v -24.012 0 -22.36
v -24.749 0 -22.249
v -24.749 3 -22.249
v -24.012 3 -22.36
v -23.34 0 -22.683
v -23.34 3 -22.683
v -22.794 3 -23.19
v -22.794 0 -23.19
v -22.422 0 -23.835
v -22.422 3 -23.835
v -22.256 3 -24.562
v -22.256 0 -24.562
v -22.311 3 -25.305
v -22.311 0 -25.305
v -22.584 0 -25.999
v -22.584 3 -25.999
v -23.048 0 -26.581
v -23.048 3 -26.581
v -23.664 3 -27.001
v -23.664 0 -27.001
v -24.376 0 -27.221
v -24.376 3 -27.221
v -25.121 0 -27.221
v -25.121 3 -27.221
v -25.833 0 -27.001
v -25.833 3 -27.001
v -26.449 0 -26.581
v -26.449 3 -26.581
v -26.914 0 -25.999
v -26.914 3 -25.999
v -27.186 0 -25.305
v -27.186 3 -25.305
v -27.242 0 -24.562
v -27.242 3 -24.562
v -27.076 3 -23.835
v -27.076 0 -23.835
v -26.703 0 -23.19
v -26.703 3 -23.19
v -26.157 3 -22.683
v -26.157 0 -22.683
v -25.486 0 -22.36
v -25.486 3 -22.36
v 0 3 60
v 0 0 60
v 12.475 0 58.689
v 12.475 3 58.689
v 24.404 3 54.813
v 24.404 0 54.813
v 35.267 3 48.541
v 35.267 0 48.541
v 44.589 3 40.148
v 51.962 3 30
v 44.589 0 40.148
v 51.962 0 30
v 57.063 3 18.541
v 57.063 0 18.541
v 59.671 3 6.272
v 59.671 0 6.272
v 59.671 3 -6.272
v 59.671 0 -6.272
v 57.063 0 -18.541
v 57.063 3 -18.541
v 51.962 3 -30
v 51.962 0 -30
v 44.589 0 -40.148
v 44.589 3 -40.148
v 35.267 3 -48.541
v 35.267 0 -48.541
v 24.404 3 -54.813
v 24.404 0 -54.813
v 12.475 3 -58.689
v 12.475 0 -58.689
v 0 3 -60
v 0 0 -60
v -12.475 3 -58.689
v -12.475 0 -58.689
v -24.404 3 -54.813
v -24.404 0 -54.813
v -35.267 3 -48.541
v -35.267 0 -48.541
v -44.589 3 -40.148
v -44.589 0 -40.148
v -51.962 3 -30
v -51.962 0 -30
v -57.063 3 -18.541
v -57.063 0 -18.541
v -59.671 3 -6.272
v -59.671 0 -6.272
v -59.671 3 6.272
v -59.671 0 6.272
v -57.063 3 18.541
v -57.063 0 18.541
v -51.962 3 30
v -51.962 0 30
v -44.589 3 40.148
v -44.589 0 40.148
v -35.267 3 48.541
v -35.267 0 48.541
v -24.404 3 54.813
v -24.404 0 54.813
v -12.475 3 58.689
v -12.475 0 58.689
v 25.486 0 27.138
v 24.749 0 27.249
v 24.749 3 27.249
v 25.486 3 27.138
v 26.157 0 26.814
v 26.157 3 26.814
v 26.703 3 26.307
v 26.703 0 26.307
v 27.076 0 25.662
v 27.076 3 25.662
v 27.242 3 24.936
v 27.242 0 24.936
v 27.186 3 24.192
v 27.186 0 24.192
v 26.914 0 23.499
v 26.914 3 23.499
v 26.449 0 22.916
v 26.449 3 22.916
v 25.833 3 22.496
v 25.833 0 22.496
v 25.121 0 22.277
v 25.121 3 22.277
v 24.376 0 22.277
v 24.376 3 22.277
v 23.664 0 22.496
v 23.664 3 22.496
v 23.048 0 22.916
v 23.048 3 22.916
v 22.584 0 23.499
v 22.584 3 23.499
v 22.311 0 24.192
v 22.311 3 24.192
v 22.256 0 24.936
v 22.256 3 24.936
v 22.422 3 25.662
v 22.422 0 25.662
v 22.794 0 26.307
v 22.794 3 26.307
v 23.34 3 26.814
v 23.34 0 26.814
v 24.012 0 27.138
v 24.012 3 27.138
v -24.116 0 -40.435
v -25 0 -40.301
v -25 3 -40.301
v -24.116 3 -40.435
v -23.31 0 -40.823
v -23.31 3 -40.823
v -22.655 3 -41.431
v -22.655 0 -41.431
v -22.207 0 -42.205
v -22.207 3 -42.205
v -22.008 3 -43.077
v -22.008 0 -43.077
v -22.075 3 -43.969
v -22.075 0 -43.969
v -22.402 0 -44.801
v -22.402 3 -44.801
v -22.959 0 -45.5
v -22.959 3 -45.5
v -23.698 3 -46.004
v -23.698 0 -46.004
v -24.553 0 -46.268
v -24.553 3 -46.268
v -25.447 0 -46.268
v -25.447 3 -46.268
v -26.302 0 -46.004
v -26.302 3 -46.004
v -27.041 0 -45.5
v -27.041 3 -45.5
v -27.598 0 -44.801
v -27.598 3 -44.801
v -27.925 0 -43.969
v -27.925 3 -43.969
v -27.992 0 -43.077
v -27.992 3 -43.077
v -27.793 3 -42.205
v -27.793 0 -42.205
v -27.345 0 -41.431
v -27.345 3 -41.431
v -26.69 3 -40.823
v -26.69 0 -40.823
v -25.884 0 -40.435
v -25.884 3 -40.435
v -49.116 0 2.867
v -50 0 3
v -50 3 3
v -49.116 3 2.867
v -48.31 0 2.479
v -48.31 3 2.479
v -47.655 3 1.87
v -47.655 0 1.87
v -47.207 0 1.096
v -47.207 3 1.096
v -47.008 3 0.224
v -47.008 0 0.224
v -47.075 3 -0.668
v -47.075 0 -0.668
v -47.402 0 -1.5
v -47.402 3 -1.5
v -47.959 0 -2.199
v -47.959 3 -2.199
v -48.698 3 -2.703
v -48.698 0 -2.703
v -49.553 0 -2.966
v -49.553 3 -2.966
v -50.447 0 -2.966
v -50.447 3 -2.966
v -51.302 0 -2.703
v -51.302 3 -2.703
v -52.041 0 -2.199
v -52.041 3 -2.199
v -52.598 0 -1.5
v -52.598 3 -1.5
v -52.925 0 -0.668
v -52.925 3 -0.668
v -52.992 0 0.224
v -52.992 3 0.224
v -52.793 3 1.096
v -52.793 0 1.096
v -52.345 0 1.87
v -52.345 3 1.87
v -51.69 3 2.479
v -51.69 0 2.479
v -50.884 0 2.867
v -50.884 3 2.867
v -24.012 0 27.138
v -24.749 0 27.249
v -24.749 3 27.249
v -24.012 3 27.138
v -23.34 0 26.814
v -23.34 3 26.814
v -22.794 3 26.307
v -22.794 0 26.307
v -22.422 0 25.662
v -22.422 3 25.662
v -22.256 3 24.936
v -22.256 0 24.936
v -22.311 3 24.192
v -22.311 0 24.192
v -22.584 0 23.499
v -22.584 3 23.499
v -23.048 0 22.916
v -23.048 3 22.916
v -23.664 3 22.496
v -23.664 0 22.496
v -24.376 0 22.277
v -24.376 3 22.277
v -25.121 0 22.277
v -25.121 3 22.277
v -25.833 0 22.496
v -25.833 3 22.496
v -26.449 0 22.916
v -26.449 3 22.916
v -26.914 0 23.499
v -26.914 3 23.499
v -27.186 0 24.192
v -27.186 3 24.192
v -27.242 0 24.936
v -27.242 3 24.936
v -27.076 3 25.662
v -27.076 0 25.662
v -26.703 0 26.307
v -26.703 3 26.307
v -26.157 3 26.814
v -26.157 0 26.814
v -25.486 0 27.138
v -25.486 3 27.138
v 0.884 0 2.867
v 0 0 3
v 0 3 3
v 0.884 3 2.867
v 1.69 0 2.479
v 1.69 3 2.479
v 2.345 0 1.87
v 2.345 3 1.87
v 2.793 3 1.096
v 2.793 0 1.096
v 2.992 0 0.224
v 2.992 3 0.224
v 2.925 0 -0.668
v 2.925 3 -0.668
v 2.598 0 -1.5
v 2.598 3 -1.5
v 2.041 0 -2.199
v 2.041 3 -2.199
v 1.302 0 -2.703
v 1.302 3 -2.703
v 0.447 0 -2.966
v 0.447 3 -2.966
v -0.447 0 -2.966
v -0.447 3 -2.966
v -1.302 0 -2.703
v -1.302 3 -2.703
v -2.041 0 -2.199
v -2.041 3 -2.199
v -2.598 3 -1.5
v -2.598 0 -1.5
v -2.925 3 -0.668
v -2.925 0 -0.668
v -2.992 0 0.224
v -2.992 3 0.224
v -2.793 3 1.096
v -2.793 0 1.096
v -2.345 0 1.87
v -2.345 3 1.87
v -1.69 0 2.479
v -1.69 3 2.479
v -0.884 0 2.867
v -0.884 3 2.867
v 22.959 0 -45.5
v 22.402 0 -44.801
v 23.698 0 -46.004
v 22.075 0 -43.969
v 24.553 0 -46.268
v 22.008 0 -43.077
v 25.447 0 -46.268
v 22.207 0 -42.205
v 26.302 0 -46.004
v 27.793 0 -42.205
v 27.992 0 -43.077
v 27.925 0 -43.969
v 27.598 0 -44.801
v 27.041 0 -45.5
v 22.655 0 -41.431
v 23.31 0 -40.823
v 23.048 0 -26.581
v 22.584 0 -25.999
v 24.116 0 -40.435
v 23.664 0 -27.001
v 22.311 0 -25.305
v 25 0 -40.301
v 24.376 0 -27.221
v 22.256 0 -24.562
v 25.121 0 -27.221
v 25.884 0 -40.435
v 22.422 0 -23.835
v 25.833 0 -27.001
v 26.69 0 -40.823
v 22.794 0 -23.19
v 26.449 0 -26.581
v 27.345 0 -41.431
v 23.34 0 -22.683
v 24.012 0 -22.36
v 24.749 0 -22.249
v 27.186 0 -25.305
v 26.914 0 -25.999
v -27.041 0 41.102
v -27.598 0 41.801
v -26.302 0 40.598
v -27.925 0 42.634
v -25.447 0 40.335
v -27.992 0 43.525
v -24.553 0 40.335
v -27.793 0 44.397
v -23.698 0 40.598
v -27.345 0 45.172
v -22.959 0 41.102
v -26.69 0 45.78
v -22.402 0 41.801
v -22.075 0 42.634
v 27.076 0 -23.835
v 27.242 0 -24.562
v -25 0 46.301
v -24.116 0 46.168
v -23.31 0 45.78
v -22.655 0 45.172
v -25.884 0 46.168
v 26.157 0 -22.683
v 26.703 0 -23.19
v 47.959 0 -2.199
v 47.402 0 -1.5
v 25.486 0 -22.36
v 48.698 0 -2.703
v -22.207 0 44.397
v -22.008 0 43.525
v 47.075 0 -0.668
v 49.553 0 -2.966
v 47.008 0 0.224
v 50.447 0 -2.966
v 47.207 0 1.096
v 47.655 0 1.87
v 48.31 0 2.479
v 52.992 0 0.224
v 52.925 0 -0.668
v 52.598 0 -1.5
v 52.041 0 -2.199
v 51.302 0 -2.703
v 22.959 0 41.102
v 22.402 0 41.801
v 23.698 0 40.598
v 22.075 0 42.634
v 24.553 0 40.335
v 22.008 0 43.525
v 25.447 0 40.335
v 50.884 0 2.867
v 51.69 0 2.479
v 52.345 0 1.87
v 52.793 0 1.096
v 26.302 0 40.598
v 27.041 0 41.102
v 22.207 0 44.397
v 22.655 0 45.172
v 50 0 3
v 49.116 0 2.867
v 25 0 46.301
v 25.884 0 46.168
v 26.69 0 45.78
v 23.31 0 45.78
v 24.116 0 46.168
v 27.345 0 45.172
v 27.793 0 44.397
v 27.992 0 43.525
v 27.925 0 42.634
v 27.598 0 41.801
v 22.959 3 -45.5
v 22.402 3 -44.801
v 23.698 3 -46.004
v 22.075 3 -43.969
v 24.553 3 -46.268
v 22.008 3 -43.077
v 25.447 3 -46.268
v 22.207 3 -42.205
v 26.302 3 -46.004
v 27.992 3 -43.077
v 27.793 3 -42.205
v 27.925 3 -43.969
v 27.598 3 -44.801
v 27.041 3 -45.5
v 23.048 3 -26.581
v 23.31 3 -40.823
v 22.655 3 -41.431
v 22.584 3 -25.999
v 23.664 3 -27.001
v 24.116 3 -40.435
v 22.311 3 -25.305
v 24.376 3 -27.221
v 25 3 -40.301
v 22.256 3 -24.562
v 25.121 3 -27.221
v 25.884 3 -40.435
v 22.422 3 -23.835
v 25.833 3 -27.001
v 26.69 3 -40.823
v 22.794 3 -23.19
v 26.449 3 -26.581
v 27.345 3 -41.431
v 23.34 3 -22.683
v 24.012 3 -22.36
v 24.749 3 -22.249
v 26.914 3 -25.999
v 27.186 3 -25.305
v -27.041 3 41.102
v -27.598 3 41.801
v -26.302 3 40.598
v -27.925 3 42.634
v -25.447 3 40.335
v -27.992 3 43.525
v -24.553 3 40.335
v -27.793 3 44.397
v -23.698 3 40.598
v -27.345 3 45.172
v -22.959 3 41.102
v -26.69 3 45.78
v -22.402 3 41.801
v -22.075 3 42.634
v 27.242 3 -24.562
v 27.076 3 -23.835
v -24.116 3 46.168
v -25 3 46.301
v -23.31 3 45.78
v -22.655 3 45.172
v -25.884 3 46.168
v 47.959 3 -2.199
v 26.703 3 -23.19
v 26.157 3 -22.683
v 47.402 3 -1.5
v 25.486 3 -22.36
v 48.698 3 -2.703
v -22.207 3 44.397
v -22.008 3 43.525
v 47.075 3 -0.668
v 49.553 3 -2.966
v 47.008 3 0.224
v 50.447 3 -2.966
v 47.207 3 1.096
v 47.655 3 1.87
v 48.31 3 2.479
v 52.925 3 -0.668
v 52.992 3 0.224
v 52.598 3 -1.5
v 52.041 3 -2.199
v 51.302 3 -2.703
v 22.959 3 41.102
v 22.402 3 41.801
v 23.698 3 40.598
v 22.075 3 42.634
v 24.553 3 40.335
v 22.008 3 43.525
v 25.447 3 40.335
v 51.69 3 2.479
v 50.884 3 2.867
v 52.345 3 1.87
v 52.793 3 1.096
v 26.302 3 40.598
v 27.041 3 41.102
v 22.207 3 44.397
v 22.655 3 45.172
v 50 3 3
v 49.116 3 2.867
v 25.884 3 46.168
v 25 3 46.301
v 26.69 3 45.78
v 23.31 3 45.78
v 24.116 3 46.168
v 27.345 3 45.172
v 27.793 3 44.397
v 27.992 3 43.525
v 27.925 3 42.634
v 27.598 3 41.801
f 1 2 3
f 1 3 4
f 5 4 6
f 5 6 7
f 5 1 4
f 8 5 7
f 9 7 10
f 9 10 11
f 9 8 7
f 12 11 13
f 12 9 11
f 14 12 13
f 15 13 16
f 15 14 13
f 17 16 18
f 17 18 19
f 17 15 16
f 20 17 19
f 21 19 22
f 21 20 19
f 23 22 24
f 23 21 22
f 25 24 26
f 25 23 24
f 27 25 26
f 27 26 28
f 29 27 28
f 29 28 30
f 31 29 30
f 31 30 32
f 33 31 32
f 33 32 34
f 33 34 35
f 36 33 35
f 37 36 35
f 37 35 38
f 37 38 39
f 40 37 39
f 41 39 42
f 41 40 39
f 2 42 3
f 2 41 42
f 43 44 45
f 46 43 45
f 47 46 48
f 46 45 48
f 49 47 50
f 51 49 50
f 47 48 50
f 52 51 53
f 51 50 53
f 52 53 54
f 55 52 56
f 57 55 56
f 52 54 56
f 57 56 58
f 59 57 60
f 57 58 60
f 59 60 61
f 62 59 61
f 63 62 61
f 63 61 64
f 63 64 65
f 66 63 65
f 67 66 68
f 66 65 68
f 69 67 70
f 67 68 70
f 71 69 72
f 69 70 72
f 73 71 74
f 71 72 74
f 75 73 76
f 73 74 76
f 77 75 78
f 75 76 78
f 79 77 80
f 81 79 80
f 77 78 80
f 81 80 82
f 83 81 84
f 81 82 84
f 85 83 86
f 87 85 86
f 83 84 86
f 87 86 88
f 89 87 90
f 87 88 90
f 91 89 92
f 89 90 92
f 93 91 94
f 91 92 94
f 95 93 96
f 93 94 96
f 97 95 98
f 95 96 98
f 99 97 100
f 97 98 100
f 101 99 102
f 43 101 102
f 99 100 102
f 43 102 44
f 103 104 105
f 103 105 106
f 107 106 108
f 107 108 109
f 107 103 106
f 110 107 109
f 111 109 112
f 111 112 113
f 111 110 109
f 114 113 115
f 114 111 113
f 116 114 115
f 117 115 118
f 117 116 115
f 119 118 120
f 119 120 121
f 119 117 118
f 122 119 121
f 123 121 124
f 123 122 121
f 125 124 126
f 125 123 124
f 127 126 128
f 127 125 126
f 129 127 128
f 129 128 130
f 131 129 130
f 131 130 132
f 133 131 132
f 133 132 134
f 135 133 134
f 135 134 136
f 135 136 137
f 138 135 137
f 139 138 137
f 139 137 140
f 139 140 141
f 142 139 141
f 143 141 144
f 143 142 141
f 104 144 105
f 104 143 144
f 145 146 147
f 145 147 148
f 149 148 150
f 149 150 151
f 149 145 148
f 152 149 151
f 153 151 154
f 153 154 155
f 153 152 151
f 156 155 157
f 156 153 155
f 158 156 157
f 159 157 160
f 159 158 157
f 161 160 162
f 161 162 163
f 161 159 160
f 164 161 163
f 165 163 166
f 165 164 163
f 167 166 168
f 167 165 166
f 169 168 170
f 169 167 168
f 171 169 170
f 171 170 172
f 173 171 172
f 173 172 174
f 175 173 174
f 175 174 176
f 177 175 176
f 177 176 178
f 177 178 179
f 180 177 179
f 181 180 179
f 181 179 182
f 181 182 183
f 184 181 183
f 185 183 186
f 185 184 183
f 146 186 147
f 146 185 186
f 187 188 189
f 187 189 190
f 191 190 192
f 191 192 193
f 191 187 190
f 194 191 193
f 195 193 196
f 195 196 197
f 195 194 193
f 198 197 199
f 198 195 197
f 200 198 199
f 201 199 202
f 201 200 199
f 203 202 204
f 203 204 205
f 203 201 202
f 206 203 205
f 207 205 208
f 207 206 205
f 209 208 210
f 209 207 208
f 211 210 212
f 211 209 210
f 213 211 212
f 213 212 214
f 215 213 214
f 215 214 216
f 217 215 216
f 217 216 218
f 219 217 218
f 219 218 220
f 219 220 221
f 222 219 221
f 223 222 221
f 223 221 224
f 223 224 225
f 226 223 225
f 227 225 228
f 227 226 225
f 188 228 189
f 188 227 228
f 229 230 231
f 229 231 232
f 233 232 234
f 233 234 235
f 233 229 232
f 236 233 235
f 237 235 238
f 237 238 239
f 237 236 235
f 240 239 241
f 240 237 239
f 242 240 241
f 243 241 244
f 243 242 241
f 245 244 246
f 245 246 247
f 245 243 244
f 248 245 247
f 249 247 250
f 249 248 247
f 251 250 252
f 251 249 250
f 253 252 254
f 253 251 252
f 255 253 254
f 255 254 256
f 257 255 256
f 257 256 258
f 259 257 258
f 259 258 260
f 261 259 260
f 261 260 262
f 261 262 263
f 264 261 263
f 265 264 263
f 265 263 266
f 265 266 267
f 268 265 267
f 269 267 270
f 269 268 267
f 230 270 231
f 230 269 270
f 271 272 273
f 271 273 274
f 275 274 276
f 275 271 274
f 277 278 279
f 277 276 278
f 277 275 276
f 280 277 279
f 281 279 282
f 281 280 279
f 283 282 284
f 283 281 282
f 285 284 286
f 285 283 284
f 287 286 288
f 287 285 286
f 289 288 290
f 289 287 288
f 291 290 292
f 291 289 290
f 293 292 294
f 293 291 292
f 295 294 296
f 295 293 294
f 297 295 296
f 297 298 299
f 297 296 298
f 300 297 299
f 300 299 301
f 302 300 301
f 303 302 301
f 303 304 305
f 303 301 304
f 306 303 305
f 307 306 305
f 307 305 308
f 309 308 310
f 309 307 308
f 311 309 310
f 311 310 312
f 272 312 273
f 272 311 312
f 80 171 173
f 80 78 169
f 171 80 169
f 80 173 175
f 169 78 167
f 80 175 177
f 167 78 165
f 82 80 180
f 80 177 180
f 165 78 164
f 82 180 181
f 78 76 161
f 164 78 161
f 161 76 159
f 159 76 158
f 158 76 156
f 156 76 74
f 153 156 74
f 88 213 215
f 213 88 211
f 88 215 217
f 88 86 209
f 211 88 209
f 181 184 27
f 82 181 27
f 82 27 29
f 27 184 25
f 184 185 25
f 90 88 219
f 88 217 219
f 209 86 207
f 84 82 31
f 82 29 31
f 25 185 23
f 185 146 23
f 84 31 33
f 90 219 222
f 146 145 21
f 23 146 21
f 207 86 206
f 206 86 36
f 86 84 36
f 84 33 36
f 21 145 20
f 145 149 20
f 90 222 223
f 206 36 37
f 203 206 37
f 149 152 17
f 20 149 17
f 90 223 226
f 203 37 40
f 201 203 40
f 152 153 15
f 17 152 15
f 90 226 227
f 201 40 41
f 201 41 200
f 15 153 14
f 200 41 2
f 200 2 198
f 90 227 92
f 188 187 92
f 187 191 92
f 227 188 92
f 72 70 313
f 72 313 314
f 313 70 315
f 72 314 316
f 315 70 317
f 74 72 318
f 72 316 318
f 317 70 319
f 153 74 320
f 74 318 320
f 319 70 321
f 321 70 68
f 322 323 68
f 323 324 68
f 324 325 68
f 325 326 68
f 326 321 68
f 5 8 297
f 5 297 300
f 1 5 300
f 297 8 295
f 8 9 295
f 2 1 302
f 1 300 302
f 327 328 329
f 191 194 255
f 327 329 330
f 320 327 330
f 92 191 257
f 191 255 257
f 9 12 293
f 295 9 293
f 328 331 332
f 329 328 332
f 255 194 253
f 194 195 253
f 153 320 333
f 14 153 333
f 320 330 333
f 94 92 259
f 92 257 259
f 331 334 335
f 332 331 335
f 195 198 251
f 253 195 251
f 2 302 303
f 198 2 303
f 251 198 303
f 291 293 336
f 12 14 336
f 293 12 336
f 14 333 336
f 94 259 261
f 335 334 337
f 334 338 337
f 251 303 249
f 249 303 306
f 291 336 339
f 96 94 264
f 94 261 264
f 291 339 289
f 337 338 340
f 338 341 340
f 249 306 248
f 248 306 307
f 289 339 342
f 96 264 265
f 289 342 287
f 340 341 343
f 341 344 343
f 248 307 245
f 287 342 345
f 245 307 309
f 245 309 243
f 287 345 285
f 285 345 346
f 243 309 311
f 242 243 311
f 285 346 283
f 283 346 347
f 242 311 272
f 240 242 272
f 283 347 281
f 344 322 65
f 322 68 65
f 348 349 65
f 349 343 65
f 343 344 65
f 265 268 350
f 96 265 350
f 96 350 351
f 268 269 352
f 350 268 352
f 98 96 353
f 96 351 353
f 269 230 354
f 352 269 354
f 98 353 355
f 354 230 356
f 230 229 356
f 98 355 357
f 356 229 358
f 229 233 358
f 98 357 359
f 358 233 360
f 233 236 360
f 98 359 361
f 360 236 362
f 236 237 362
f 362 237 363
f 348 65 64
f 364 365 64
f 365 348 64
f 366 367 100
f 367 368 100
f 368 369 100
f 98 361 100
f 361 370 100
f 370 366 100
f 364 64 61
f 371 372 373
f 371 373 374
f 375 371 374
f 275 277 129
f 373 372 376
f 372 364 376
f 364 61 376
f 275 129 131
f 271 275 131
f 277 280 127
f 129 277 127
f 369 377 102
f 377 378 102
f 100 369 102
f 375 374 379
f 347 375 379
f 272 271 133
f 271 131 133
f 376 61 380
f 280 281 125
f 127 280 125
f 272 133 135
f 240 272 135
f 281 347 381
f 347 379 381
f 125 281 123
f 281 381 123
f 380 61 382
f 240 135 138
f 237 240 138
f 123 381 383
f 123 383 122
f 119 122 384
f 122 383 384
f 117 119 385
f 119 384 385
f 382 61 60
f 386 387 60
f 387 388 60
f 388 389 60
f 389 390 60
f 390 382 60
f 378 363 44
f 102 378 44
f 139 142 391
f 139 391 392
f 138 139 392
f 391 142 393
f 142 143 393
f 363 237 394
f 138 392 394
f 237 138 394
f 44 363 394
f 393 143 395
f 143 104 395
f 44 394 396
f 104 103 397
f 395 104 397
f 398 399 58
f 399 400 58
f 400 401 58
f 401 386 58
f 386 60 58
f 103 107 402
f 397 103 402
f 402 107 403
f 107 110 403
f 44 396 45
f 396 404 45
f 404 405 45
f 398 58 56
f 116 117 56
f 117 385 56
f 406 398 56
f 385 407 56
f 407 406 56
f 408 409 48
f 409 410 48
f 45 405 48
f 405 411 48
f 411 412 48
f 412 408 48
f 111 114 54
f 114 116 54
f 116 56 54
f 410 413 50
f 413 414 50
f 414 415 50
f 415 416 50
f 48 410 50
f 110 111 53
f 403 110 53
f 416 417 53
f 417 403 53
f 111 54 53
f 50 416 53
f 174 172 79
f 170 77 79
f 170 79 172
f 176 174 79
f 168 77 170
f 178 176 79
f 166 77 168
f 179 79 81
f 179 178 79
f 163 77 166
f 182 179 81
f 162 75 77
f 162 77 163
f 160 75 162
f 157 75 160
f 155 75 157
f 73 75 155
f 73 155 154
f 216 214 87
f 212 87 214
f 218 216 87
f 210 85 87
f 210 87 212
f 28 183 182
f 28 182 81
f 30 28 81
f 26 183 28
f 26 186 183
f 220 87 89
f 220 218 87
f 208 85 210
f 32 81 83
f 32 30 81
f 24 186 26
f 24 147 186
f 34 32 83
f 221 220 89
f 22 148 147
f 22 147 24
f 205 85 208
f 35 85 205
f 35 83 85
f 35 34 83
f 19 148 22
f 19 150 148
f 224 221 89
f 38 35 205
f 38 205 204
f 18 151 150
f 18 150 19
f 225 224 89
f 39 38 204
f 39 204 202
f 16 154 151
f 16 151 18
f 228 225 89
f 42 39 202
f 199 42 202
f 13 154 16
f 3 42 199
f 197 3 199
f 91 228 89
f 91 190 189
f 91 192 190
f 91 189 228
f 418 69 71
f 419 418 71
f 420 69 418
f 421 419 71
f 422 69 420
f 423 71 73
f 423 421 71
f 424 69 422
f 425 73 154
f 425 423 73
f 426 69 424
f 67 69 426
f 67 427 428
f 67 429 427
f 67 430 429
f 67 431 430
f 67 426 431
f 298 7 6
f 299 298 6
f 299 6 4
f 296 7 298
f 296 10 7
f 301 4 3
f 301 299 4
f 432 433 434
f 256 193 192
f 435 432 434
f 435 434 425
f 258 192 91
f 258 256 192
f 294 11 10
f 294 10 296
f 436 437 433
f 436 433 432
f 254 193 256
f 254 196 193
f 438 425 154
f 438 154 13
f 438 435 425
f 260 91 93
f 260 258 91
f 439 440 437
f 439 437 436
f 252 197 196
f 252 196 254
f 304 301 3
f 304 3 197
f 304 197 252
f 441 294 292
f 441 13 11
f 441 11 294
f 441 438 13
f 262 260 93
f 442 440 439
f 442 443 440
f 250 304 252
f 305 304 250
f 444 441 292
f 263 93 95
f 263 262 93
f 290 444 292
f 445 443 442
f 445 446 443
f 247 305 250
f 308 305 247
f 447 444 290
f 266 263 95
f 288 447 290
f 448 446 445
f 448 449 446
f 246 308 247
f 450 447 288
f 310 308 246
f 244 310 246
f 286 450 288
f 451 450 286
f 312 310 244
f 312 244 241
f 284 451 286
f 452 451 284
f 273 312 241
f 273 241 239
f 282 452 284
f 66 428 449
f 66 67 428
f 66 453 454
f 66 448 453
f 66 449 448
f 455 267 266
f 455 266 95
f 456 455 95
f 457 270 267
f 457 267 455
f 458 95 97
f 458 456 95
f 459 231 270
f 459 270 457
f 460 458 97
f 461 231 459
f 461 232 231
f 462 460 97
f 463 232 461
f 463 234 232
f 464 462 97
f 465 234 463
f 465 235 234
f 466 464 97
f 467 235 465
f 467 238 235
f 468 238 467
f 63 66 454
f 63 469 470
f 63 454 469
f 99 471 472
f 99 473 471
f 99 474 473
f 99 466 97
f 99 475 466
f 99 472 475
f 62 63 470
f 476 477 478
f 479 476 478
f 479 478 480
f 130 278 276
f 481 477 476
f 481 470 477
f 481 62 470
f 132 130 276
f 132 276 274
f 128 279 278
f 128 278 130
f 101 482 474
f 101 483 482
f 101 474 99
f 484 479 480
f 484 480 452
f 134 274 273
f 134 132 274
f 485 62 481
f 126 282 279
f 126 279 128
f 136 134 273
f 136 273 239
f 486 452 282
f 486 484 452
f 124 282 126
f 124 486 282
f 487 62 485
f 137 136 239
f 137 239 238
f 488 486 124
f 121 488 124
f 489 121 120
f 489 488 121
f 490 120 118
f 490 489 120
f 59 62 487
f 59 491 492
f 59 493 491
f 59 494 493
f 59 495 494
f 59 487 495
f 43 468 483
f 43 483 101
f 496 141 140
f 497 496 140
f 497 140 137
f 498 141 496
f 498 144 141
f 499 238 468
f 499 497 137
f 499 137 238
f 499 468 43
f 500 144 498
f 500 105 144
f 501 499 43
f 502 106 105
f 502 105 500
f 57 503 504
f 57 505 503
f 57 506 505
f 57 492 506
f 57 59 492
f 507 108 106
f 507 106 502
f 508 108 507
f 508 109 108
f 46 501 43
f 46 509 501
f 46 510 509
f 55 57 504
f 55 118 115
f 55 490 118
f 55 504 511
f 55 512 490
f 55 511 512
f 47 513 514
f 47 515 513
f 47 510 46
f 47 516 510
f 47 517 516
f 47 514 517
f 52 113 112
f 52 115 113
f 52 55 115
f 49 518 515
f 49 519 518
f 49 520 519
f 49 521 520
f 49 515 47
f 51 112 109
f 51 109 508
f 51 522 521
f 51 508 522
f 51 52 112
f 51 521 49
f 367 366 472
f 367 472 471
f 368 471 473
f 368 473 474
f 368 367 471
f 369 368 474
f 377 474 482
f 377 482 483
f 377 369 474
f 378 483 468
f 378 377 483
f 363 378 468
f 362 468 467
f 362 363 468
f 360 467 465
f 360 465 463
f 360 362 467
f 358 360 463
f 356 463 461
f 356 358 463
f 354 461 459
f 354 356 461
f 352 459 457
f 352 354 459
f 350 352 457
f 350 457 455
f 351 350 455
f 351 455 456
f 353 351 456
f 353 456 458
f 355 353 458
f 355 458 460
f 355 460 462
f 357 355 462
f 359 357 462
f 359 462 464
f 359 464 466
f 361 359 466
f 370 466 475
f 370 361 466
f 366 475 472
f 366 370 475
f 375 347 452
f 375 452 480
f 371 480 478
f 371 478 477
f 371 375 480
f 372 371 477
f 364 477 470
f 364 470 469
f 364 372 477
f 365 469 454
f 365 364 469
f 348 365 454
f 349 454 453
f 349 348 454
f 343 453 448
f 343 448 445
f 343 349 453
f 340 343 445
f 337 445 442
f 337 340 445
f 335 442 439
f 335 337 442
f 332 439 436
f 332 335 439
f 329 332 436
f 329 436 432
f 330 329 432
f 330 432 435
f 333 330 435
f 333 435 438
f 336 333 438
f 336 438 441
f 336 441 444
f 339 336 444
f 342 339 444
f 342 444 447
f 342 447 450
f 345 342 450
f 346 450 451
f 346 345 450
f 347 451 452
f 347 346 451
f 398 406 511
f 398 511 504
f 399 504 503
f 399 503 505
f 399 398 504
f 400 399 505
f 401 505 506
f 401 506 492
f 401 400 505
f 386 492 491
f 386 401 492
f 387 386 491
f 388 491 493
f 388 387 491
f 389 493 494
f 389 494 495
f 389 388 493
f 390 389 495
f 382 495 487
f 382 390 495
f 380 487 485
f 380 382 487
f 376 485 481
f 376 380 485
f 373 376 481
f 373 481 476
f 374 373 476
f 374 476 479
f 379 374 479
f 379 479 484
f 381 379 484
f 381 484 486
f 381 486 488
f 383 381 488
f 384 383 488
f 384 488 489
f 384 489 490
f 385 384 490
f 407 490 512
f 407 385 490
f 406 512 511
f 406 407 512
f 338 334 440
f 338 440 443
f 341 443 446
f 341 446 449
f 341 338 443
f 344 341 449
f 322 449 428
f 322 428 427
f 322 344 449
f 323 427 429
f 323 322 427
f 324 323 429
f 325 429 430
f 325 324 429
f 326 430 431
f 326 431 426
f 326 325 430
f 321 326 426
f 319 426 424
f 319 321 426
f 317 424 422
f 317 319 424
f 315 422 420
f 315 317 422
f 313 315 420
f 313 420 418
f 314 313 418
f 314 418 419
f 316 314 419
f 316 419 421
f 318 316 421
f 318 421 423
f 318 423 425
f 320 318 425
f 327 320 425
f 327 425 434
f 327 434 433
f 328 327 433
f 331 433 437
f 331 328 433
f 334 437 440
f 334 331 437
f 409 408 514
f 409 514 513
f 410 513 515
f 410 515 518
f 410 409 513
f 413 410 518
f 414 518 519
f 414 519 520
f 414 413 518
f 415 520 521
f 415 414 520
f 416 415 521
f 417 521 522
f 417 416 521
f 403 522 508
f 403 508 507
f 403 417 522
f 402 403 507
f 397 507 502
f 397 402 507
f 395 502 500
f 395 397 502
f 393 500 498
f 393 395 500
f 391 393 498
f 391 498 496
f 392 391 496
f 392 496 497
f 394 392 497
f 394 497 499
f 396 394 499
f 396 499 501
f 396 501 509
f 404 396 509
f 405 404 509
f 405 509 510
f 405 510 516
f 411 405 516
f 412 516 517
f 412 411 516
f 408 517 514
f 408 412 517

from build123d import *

# Parameters (mm, degrees)
SKETCH1_R               = 60
SKETCH1_R_2             = 2.5
SKETCH1_R_3             = 3
BOSS_EXTRUDE1_DEPTH     = 3
CUT_EXTRUDE1_DEPTH      = 85.905830189
CUT_EXTRUDE1_DEPTH_BACK = 85.905830189
SKETCH2_R               = 3


with BuildPart() as part:
    # Sketch1 → Boss-Extrude1 (new body)
    with BuildSketch(Plane(origin=(0, 0, 0), x_dir=(1, 0, 0), z_dir=(0, 1, 0))):
        with Locations(Location((0, 0, 0), (0, 0, 270))):
            Circle(SKETCH1_R)
        with Locations(Location((-24.748737342, -24.748737342, 0), (0, 0, 270))):
            Circle(SKETCH1_R_2, mode=Mode.SUBTRACT)
        with Locations(Location((24.748737342, -24.748737342, 0), (0, 0, 270))):
            Circle(SKETCH1_R_2, mode=Mode.SUBTRACT)
        with Locations(Location((24.748737342, 24.748737342, 0), (0, 0, 270))):
            Circle(SKETCH1_R_2, mode=Mode.SUBTRACT)
        with Locations(Location((-24.748737342, 24.748737342, 0), (0, 0, 270))):
            Circle(SKETCH1_R_2, mode=Mode.SUBTRACT)
        with Locations(Location((-25, -43.301270189, 0), (0, 0, 270))):
            Circle(SKETCH1_R_3, mode=Mode.SUBTRACT)
        with Locations(Location((25, -43.301270189, 0), (0, 0, 270))):
            Circle(SKETCH1_R_3, mode=Mode.SUBTRACT)
        with Locations(Location((50, 0, 0), (0, 0, 270))):
            Circle(SKETCH1_R_3, mode=Mode.SUBTRACT)
        with Locations(Location((25, 43.301270189, 0), (0, 0, 270))):
            Circle(SKETCH1_R_3, mode=Mode.SUBTRACT)
        with Locations(Location((-25, 43.301270189, 0), (0, 0, 270))):
            Circle(SKETCH1_R_3, mode=Mode.SUBTRACT)
        with Locations(Location((-50, 0, 0), (0, 0, 270))):
            Circle(SKETCH1_R_3, mode=Mode.SUBTRACT)
    extrude(amount=BOSS_EXTRUDE1_DEPTH)

    # Sketch2 → Cut-Extrude1 (cut, two sides: drawn at the far end of the back side and taken through both)
    with BuildSketch(Plane(origin=(0, 3, 0), x_dir=(1, 0, 0), z_dir=(0, 1, 0)).offset(-CUT_EXTRUDE1_DEPTH_BACK)):
        with Locations(Location((0, 0, 0), (0, 0, 270))):
            Circle(SKETCH2_R)
    extrude(amount=CUT_EXTRUDE1_DEPTH + CUT_EXTRUDE1_DEPTH_BACK, mode=Mode.SUBTRACT)


solid = part.part
